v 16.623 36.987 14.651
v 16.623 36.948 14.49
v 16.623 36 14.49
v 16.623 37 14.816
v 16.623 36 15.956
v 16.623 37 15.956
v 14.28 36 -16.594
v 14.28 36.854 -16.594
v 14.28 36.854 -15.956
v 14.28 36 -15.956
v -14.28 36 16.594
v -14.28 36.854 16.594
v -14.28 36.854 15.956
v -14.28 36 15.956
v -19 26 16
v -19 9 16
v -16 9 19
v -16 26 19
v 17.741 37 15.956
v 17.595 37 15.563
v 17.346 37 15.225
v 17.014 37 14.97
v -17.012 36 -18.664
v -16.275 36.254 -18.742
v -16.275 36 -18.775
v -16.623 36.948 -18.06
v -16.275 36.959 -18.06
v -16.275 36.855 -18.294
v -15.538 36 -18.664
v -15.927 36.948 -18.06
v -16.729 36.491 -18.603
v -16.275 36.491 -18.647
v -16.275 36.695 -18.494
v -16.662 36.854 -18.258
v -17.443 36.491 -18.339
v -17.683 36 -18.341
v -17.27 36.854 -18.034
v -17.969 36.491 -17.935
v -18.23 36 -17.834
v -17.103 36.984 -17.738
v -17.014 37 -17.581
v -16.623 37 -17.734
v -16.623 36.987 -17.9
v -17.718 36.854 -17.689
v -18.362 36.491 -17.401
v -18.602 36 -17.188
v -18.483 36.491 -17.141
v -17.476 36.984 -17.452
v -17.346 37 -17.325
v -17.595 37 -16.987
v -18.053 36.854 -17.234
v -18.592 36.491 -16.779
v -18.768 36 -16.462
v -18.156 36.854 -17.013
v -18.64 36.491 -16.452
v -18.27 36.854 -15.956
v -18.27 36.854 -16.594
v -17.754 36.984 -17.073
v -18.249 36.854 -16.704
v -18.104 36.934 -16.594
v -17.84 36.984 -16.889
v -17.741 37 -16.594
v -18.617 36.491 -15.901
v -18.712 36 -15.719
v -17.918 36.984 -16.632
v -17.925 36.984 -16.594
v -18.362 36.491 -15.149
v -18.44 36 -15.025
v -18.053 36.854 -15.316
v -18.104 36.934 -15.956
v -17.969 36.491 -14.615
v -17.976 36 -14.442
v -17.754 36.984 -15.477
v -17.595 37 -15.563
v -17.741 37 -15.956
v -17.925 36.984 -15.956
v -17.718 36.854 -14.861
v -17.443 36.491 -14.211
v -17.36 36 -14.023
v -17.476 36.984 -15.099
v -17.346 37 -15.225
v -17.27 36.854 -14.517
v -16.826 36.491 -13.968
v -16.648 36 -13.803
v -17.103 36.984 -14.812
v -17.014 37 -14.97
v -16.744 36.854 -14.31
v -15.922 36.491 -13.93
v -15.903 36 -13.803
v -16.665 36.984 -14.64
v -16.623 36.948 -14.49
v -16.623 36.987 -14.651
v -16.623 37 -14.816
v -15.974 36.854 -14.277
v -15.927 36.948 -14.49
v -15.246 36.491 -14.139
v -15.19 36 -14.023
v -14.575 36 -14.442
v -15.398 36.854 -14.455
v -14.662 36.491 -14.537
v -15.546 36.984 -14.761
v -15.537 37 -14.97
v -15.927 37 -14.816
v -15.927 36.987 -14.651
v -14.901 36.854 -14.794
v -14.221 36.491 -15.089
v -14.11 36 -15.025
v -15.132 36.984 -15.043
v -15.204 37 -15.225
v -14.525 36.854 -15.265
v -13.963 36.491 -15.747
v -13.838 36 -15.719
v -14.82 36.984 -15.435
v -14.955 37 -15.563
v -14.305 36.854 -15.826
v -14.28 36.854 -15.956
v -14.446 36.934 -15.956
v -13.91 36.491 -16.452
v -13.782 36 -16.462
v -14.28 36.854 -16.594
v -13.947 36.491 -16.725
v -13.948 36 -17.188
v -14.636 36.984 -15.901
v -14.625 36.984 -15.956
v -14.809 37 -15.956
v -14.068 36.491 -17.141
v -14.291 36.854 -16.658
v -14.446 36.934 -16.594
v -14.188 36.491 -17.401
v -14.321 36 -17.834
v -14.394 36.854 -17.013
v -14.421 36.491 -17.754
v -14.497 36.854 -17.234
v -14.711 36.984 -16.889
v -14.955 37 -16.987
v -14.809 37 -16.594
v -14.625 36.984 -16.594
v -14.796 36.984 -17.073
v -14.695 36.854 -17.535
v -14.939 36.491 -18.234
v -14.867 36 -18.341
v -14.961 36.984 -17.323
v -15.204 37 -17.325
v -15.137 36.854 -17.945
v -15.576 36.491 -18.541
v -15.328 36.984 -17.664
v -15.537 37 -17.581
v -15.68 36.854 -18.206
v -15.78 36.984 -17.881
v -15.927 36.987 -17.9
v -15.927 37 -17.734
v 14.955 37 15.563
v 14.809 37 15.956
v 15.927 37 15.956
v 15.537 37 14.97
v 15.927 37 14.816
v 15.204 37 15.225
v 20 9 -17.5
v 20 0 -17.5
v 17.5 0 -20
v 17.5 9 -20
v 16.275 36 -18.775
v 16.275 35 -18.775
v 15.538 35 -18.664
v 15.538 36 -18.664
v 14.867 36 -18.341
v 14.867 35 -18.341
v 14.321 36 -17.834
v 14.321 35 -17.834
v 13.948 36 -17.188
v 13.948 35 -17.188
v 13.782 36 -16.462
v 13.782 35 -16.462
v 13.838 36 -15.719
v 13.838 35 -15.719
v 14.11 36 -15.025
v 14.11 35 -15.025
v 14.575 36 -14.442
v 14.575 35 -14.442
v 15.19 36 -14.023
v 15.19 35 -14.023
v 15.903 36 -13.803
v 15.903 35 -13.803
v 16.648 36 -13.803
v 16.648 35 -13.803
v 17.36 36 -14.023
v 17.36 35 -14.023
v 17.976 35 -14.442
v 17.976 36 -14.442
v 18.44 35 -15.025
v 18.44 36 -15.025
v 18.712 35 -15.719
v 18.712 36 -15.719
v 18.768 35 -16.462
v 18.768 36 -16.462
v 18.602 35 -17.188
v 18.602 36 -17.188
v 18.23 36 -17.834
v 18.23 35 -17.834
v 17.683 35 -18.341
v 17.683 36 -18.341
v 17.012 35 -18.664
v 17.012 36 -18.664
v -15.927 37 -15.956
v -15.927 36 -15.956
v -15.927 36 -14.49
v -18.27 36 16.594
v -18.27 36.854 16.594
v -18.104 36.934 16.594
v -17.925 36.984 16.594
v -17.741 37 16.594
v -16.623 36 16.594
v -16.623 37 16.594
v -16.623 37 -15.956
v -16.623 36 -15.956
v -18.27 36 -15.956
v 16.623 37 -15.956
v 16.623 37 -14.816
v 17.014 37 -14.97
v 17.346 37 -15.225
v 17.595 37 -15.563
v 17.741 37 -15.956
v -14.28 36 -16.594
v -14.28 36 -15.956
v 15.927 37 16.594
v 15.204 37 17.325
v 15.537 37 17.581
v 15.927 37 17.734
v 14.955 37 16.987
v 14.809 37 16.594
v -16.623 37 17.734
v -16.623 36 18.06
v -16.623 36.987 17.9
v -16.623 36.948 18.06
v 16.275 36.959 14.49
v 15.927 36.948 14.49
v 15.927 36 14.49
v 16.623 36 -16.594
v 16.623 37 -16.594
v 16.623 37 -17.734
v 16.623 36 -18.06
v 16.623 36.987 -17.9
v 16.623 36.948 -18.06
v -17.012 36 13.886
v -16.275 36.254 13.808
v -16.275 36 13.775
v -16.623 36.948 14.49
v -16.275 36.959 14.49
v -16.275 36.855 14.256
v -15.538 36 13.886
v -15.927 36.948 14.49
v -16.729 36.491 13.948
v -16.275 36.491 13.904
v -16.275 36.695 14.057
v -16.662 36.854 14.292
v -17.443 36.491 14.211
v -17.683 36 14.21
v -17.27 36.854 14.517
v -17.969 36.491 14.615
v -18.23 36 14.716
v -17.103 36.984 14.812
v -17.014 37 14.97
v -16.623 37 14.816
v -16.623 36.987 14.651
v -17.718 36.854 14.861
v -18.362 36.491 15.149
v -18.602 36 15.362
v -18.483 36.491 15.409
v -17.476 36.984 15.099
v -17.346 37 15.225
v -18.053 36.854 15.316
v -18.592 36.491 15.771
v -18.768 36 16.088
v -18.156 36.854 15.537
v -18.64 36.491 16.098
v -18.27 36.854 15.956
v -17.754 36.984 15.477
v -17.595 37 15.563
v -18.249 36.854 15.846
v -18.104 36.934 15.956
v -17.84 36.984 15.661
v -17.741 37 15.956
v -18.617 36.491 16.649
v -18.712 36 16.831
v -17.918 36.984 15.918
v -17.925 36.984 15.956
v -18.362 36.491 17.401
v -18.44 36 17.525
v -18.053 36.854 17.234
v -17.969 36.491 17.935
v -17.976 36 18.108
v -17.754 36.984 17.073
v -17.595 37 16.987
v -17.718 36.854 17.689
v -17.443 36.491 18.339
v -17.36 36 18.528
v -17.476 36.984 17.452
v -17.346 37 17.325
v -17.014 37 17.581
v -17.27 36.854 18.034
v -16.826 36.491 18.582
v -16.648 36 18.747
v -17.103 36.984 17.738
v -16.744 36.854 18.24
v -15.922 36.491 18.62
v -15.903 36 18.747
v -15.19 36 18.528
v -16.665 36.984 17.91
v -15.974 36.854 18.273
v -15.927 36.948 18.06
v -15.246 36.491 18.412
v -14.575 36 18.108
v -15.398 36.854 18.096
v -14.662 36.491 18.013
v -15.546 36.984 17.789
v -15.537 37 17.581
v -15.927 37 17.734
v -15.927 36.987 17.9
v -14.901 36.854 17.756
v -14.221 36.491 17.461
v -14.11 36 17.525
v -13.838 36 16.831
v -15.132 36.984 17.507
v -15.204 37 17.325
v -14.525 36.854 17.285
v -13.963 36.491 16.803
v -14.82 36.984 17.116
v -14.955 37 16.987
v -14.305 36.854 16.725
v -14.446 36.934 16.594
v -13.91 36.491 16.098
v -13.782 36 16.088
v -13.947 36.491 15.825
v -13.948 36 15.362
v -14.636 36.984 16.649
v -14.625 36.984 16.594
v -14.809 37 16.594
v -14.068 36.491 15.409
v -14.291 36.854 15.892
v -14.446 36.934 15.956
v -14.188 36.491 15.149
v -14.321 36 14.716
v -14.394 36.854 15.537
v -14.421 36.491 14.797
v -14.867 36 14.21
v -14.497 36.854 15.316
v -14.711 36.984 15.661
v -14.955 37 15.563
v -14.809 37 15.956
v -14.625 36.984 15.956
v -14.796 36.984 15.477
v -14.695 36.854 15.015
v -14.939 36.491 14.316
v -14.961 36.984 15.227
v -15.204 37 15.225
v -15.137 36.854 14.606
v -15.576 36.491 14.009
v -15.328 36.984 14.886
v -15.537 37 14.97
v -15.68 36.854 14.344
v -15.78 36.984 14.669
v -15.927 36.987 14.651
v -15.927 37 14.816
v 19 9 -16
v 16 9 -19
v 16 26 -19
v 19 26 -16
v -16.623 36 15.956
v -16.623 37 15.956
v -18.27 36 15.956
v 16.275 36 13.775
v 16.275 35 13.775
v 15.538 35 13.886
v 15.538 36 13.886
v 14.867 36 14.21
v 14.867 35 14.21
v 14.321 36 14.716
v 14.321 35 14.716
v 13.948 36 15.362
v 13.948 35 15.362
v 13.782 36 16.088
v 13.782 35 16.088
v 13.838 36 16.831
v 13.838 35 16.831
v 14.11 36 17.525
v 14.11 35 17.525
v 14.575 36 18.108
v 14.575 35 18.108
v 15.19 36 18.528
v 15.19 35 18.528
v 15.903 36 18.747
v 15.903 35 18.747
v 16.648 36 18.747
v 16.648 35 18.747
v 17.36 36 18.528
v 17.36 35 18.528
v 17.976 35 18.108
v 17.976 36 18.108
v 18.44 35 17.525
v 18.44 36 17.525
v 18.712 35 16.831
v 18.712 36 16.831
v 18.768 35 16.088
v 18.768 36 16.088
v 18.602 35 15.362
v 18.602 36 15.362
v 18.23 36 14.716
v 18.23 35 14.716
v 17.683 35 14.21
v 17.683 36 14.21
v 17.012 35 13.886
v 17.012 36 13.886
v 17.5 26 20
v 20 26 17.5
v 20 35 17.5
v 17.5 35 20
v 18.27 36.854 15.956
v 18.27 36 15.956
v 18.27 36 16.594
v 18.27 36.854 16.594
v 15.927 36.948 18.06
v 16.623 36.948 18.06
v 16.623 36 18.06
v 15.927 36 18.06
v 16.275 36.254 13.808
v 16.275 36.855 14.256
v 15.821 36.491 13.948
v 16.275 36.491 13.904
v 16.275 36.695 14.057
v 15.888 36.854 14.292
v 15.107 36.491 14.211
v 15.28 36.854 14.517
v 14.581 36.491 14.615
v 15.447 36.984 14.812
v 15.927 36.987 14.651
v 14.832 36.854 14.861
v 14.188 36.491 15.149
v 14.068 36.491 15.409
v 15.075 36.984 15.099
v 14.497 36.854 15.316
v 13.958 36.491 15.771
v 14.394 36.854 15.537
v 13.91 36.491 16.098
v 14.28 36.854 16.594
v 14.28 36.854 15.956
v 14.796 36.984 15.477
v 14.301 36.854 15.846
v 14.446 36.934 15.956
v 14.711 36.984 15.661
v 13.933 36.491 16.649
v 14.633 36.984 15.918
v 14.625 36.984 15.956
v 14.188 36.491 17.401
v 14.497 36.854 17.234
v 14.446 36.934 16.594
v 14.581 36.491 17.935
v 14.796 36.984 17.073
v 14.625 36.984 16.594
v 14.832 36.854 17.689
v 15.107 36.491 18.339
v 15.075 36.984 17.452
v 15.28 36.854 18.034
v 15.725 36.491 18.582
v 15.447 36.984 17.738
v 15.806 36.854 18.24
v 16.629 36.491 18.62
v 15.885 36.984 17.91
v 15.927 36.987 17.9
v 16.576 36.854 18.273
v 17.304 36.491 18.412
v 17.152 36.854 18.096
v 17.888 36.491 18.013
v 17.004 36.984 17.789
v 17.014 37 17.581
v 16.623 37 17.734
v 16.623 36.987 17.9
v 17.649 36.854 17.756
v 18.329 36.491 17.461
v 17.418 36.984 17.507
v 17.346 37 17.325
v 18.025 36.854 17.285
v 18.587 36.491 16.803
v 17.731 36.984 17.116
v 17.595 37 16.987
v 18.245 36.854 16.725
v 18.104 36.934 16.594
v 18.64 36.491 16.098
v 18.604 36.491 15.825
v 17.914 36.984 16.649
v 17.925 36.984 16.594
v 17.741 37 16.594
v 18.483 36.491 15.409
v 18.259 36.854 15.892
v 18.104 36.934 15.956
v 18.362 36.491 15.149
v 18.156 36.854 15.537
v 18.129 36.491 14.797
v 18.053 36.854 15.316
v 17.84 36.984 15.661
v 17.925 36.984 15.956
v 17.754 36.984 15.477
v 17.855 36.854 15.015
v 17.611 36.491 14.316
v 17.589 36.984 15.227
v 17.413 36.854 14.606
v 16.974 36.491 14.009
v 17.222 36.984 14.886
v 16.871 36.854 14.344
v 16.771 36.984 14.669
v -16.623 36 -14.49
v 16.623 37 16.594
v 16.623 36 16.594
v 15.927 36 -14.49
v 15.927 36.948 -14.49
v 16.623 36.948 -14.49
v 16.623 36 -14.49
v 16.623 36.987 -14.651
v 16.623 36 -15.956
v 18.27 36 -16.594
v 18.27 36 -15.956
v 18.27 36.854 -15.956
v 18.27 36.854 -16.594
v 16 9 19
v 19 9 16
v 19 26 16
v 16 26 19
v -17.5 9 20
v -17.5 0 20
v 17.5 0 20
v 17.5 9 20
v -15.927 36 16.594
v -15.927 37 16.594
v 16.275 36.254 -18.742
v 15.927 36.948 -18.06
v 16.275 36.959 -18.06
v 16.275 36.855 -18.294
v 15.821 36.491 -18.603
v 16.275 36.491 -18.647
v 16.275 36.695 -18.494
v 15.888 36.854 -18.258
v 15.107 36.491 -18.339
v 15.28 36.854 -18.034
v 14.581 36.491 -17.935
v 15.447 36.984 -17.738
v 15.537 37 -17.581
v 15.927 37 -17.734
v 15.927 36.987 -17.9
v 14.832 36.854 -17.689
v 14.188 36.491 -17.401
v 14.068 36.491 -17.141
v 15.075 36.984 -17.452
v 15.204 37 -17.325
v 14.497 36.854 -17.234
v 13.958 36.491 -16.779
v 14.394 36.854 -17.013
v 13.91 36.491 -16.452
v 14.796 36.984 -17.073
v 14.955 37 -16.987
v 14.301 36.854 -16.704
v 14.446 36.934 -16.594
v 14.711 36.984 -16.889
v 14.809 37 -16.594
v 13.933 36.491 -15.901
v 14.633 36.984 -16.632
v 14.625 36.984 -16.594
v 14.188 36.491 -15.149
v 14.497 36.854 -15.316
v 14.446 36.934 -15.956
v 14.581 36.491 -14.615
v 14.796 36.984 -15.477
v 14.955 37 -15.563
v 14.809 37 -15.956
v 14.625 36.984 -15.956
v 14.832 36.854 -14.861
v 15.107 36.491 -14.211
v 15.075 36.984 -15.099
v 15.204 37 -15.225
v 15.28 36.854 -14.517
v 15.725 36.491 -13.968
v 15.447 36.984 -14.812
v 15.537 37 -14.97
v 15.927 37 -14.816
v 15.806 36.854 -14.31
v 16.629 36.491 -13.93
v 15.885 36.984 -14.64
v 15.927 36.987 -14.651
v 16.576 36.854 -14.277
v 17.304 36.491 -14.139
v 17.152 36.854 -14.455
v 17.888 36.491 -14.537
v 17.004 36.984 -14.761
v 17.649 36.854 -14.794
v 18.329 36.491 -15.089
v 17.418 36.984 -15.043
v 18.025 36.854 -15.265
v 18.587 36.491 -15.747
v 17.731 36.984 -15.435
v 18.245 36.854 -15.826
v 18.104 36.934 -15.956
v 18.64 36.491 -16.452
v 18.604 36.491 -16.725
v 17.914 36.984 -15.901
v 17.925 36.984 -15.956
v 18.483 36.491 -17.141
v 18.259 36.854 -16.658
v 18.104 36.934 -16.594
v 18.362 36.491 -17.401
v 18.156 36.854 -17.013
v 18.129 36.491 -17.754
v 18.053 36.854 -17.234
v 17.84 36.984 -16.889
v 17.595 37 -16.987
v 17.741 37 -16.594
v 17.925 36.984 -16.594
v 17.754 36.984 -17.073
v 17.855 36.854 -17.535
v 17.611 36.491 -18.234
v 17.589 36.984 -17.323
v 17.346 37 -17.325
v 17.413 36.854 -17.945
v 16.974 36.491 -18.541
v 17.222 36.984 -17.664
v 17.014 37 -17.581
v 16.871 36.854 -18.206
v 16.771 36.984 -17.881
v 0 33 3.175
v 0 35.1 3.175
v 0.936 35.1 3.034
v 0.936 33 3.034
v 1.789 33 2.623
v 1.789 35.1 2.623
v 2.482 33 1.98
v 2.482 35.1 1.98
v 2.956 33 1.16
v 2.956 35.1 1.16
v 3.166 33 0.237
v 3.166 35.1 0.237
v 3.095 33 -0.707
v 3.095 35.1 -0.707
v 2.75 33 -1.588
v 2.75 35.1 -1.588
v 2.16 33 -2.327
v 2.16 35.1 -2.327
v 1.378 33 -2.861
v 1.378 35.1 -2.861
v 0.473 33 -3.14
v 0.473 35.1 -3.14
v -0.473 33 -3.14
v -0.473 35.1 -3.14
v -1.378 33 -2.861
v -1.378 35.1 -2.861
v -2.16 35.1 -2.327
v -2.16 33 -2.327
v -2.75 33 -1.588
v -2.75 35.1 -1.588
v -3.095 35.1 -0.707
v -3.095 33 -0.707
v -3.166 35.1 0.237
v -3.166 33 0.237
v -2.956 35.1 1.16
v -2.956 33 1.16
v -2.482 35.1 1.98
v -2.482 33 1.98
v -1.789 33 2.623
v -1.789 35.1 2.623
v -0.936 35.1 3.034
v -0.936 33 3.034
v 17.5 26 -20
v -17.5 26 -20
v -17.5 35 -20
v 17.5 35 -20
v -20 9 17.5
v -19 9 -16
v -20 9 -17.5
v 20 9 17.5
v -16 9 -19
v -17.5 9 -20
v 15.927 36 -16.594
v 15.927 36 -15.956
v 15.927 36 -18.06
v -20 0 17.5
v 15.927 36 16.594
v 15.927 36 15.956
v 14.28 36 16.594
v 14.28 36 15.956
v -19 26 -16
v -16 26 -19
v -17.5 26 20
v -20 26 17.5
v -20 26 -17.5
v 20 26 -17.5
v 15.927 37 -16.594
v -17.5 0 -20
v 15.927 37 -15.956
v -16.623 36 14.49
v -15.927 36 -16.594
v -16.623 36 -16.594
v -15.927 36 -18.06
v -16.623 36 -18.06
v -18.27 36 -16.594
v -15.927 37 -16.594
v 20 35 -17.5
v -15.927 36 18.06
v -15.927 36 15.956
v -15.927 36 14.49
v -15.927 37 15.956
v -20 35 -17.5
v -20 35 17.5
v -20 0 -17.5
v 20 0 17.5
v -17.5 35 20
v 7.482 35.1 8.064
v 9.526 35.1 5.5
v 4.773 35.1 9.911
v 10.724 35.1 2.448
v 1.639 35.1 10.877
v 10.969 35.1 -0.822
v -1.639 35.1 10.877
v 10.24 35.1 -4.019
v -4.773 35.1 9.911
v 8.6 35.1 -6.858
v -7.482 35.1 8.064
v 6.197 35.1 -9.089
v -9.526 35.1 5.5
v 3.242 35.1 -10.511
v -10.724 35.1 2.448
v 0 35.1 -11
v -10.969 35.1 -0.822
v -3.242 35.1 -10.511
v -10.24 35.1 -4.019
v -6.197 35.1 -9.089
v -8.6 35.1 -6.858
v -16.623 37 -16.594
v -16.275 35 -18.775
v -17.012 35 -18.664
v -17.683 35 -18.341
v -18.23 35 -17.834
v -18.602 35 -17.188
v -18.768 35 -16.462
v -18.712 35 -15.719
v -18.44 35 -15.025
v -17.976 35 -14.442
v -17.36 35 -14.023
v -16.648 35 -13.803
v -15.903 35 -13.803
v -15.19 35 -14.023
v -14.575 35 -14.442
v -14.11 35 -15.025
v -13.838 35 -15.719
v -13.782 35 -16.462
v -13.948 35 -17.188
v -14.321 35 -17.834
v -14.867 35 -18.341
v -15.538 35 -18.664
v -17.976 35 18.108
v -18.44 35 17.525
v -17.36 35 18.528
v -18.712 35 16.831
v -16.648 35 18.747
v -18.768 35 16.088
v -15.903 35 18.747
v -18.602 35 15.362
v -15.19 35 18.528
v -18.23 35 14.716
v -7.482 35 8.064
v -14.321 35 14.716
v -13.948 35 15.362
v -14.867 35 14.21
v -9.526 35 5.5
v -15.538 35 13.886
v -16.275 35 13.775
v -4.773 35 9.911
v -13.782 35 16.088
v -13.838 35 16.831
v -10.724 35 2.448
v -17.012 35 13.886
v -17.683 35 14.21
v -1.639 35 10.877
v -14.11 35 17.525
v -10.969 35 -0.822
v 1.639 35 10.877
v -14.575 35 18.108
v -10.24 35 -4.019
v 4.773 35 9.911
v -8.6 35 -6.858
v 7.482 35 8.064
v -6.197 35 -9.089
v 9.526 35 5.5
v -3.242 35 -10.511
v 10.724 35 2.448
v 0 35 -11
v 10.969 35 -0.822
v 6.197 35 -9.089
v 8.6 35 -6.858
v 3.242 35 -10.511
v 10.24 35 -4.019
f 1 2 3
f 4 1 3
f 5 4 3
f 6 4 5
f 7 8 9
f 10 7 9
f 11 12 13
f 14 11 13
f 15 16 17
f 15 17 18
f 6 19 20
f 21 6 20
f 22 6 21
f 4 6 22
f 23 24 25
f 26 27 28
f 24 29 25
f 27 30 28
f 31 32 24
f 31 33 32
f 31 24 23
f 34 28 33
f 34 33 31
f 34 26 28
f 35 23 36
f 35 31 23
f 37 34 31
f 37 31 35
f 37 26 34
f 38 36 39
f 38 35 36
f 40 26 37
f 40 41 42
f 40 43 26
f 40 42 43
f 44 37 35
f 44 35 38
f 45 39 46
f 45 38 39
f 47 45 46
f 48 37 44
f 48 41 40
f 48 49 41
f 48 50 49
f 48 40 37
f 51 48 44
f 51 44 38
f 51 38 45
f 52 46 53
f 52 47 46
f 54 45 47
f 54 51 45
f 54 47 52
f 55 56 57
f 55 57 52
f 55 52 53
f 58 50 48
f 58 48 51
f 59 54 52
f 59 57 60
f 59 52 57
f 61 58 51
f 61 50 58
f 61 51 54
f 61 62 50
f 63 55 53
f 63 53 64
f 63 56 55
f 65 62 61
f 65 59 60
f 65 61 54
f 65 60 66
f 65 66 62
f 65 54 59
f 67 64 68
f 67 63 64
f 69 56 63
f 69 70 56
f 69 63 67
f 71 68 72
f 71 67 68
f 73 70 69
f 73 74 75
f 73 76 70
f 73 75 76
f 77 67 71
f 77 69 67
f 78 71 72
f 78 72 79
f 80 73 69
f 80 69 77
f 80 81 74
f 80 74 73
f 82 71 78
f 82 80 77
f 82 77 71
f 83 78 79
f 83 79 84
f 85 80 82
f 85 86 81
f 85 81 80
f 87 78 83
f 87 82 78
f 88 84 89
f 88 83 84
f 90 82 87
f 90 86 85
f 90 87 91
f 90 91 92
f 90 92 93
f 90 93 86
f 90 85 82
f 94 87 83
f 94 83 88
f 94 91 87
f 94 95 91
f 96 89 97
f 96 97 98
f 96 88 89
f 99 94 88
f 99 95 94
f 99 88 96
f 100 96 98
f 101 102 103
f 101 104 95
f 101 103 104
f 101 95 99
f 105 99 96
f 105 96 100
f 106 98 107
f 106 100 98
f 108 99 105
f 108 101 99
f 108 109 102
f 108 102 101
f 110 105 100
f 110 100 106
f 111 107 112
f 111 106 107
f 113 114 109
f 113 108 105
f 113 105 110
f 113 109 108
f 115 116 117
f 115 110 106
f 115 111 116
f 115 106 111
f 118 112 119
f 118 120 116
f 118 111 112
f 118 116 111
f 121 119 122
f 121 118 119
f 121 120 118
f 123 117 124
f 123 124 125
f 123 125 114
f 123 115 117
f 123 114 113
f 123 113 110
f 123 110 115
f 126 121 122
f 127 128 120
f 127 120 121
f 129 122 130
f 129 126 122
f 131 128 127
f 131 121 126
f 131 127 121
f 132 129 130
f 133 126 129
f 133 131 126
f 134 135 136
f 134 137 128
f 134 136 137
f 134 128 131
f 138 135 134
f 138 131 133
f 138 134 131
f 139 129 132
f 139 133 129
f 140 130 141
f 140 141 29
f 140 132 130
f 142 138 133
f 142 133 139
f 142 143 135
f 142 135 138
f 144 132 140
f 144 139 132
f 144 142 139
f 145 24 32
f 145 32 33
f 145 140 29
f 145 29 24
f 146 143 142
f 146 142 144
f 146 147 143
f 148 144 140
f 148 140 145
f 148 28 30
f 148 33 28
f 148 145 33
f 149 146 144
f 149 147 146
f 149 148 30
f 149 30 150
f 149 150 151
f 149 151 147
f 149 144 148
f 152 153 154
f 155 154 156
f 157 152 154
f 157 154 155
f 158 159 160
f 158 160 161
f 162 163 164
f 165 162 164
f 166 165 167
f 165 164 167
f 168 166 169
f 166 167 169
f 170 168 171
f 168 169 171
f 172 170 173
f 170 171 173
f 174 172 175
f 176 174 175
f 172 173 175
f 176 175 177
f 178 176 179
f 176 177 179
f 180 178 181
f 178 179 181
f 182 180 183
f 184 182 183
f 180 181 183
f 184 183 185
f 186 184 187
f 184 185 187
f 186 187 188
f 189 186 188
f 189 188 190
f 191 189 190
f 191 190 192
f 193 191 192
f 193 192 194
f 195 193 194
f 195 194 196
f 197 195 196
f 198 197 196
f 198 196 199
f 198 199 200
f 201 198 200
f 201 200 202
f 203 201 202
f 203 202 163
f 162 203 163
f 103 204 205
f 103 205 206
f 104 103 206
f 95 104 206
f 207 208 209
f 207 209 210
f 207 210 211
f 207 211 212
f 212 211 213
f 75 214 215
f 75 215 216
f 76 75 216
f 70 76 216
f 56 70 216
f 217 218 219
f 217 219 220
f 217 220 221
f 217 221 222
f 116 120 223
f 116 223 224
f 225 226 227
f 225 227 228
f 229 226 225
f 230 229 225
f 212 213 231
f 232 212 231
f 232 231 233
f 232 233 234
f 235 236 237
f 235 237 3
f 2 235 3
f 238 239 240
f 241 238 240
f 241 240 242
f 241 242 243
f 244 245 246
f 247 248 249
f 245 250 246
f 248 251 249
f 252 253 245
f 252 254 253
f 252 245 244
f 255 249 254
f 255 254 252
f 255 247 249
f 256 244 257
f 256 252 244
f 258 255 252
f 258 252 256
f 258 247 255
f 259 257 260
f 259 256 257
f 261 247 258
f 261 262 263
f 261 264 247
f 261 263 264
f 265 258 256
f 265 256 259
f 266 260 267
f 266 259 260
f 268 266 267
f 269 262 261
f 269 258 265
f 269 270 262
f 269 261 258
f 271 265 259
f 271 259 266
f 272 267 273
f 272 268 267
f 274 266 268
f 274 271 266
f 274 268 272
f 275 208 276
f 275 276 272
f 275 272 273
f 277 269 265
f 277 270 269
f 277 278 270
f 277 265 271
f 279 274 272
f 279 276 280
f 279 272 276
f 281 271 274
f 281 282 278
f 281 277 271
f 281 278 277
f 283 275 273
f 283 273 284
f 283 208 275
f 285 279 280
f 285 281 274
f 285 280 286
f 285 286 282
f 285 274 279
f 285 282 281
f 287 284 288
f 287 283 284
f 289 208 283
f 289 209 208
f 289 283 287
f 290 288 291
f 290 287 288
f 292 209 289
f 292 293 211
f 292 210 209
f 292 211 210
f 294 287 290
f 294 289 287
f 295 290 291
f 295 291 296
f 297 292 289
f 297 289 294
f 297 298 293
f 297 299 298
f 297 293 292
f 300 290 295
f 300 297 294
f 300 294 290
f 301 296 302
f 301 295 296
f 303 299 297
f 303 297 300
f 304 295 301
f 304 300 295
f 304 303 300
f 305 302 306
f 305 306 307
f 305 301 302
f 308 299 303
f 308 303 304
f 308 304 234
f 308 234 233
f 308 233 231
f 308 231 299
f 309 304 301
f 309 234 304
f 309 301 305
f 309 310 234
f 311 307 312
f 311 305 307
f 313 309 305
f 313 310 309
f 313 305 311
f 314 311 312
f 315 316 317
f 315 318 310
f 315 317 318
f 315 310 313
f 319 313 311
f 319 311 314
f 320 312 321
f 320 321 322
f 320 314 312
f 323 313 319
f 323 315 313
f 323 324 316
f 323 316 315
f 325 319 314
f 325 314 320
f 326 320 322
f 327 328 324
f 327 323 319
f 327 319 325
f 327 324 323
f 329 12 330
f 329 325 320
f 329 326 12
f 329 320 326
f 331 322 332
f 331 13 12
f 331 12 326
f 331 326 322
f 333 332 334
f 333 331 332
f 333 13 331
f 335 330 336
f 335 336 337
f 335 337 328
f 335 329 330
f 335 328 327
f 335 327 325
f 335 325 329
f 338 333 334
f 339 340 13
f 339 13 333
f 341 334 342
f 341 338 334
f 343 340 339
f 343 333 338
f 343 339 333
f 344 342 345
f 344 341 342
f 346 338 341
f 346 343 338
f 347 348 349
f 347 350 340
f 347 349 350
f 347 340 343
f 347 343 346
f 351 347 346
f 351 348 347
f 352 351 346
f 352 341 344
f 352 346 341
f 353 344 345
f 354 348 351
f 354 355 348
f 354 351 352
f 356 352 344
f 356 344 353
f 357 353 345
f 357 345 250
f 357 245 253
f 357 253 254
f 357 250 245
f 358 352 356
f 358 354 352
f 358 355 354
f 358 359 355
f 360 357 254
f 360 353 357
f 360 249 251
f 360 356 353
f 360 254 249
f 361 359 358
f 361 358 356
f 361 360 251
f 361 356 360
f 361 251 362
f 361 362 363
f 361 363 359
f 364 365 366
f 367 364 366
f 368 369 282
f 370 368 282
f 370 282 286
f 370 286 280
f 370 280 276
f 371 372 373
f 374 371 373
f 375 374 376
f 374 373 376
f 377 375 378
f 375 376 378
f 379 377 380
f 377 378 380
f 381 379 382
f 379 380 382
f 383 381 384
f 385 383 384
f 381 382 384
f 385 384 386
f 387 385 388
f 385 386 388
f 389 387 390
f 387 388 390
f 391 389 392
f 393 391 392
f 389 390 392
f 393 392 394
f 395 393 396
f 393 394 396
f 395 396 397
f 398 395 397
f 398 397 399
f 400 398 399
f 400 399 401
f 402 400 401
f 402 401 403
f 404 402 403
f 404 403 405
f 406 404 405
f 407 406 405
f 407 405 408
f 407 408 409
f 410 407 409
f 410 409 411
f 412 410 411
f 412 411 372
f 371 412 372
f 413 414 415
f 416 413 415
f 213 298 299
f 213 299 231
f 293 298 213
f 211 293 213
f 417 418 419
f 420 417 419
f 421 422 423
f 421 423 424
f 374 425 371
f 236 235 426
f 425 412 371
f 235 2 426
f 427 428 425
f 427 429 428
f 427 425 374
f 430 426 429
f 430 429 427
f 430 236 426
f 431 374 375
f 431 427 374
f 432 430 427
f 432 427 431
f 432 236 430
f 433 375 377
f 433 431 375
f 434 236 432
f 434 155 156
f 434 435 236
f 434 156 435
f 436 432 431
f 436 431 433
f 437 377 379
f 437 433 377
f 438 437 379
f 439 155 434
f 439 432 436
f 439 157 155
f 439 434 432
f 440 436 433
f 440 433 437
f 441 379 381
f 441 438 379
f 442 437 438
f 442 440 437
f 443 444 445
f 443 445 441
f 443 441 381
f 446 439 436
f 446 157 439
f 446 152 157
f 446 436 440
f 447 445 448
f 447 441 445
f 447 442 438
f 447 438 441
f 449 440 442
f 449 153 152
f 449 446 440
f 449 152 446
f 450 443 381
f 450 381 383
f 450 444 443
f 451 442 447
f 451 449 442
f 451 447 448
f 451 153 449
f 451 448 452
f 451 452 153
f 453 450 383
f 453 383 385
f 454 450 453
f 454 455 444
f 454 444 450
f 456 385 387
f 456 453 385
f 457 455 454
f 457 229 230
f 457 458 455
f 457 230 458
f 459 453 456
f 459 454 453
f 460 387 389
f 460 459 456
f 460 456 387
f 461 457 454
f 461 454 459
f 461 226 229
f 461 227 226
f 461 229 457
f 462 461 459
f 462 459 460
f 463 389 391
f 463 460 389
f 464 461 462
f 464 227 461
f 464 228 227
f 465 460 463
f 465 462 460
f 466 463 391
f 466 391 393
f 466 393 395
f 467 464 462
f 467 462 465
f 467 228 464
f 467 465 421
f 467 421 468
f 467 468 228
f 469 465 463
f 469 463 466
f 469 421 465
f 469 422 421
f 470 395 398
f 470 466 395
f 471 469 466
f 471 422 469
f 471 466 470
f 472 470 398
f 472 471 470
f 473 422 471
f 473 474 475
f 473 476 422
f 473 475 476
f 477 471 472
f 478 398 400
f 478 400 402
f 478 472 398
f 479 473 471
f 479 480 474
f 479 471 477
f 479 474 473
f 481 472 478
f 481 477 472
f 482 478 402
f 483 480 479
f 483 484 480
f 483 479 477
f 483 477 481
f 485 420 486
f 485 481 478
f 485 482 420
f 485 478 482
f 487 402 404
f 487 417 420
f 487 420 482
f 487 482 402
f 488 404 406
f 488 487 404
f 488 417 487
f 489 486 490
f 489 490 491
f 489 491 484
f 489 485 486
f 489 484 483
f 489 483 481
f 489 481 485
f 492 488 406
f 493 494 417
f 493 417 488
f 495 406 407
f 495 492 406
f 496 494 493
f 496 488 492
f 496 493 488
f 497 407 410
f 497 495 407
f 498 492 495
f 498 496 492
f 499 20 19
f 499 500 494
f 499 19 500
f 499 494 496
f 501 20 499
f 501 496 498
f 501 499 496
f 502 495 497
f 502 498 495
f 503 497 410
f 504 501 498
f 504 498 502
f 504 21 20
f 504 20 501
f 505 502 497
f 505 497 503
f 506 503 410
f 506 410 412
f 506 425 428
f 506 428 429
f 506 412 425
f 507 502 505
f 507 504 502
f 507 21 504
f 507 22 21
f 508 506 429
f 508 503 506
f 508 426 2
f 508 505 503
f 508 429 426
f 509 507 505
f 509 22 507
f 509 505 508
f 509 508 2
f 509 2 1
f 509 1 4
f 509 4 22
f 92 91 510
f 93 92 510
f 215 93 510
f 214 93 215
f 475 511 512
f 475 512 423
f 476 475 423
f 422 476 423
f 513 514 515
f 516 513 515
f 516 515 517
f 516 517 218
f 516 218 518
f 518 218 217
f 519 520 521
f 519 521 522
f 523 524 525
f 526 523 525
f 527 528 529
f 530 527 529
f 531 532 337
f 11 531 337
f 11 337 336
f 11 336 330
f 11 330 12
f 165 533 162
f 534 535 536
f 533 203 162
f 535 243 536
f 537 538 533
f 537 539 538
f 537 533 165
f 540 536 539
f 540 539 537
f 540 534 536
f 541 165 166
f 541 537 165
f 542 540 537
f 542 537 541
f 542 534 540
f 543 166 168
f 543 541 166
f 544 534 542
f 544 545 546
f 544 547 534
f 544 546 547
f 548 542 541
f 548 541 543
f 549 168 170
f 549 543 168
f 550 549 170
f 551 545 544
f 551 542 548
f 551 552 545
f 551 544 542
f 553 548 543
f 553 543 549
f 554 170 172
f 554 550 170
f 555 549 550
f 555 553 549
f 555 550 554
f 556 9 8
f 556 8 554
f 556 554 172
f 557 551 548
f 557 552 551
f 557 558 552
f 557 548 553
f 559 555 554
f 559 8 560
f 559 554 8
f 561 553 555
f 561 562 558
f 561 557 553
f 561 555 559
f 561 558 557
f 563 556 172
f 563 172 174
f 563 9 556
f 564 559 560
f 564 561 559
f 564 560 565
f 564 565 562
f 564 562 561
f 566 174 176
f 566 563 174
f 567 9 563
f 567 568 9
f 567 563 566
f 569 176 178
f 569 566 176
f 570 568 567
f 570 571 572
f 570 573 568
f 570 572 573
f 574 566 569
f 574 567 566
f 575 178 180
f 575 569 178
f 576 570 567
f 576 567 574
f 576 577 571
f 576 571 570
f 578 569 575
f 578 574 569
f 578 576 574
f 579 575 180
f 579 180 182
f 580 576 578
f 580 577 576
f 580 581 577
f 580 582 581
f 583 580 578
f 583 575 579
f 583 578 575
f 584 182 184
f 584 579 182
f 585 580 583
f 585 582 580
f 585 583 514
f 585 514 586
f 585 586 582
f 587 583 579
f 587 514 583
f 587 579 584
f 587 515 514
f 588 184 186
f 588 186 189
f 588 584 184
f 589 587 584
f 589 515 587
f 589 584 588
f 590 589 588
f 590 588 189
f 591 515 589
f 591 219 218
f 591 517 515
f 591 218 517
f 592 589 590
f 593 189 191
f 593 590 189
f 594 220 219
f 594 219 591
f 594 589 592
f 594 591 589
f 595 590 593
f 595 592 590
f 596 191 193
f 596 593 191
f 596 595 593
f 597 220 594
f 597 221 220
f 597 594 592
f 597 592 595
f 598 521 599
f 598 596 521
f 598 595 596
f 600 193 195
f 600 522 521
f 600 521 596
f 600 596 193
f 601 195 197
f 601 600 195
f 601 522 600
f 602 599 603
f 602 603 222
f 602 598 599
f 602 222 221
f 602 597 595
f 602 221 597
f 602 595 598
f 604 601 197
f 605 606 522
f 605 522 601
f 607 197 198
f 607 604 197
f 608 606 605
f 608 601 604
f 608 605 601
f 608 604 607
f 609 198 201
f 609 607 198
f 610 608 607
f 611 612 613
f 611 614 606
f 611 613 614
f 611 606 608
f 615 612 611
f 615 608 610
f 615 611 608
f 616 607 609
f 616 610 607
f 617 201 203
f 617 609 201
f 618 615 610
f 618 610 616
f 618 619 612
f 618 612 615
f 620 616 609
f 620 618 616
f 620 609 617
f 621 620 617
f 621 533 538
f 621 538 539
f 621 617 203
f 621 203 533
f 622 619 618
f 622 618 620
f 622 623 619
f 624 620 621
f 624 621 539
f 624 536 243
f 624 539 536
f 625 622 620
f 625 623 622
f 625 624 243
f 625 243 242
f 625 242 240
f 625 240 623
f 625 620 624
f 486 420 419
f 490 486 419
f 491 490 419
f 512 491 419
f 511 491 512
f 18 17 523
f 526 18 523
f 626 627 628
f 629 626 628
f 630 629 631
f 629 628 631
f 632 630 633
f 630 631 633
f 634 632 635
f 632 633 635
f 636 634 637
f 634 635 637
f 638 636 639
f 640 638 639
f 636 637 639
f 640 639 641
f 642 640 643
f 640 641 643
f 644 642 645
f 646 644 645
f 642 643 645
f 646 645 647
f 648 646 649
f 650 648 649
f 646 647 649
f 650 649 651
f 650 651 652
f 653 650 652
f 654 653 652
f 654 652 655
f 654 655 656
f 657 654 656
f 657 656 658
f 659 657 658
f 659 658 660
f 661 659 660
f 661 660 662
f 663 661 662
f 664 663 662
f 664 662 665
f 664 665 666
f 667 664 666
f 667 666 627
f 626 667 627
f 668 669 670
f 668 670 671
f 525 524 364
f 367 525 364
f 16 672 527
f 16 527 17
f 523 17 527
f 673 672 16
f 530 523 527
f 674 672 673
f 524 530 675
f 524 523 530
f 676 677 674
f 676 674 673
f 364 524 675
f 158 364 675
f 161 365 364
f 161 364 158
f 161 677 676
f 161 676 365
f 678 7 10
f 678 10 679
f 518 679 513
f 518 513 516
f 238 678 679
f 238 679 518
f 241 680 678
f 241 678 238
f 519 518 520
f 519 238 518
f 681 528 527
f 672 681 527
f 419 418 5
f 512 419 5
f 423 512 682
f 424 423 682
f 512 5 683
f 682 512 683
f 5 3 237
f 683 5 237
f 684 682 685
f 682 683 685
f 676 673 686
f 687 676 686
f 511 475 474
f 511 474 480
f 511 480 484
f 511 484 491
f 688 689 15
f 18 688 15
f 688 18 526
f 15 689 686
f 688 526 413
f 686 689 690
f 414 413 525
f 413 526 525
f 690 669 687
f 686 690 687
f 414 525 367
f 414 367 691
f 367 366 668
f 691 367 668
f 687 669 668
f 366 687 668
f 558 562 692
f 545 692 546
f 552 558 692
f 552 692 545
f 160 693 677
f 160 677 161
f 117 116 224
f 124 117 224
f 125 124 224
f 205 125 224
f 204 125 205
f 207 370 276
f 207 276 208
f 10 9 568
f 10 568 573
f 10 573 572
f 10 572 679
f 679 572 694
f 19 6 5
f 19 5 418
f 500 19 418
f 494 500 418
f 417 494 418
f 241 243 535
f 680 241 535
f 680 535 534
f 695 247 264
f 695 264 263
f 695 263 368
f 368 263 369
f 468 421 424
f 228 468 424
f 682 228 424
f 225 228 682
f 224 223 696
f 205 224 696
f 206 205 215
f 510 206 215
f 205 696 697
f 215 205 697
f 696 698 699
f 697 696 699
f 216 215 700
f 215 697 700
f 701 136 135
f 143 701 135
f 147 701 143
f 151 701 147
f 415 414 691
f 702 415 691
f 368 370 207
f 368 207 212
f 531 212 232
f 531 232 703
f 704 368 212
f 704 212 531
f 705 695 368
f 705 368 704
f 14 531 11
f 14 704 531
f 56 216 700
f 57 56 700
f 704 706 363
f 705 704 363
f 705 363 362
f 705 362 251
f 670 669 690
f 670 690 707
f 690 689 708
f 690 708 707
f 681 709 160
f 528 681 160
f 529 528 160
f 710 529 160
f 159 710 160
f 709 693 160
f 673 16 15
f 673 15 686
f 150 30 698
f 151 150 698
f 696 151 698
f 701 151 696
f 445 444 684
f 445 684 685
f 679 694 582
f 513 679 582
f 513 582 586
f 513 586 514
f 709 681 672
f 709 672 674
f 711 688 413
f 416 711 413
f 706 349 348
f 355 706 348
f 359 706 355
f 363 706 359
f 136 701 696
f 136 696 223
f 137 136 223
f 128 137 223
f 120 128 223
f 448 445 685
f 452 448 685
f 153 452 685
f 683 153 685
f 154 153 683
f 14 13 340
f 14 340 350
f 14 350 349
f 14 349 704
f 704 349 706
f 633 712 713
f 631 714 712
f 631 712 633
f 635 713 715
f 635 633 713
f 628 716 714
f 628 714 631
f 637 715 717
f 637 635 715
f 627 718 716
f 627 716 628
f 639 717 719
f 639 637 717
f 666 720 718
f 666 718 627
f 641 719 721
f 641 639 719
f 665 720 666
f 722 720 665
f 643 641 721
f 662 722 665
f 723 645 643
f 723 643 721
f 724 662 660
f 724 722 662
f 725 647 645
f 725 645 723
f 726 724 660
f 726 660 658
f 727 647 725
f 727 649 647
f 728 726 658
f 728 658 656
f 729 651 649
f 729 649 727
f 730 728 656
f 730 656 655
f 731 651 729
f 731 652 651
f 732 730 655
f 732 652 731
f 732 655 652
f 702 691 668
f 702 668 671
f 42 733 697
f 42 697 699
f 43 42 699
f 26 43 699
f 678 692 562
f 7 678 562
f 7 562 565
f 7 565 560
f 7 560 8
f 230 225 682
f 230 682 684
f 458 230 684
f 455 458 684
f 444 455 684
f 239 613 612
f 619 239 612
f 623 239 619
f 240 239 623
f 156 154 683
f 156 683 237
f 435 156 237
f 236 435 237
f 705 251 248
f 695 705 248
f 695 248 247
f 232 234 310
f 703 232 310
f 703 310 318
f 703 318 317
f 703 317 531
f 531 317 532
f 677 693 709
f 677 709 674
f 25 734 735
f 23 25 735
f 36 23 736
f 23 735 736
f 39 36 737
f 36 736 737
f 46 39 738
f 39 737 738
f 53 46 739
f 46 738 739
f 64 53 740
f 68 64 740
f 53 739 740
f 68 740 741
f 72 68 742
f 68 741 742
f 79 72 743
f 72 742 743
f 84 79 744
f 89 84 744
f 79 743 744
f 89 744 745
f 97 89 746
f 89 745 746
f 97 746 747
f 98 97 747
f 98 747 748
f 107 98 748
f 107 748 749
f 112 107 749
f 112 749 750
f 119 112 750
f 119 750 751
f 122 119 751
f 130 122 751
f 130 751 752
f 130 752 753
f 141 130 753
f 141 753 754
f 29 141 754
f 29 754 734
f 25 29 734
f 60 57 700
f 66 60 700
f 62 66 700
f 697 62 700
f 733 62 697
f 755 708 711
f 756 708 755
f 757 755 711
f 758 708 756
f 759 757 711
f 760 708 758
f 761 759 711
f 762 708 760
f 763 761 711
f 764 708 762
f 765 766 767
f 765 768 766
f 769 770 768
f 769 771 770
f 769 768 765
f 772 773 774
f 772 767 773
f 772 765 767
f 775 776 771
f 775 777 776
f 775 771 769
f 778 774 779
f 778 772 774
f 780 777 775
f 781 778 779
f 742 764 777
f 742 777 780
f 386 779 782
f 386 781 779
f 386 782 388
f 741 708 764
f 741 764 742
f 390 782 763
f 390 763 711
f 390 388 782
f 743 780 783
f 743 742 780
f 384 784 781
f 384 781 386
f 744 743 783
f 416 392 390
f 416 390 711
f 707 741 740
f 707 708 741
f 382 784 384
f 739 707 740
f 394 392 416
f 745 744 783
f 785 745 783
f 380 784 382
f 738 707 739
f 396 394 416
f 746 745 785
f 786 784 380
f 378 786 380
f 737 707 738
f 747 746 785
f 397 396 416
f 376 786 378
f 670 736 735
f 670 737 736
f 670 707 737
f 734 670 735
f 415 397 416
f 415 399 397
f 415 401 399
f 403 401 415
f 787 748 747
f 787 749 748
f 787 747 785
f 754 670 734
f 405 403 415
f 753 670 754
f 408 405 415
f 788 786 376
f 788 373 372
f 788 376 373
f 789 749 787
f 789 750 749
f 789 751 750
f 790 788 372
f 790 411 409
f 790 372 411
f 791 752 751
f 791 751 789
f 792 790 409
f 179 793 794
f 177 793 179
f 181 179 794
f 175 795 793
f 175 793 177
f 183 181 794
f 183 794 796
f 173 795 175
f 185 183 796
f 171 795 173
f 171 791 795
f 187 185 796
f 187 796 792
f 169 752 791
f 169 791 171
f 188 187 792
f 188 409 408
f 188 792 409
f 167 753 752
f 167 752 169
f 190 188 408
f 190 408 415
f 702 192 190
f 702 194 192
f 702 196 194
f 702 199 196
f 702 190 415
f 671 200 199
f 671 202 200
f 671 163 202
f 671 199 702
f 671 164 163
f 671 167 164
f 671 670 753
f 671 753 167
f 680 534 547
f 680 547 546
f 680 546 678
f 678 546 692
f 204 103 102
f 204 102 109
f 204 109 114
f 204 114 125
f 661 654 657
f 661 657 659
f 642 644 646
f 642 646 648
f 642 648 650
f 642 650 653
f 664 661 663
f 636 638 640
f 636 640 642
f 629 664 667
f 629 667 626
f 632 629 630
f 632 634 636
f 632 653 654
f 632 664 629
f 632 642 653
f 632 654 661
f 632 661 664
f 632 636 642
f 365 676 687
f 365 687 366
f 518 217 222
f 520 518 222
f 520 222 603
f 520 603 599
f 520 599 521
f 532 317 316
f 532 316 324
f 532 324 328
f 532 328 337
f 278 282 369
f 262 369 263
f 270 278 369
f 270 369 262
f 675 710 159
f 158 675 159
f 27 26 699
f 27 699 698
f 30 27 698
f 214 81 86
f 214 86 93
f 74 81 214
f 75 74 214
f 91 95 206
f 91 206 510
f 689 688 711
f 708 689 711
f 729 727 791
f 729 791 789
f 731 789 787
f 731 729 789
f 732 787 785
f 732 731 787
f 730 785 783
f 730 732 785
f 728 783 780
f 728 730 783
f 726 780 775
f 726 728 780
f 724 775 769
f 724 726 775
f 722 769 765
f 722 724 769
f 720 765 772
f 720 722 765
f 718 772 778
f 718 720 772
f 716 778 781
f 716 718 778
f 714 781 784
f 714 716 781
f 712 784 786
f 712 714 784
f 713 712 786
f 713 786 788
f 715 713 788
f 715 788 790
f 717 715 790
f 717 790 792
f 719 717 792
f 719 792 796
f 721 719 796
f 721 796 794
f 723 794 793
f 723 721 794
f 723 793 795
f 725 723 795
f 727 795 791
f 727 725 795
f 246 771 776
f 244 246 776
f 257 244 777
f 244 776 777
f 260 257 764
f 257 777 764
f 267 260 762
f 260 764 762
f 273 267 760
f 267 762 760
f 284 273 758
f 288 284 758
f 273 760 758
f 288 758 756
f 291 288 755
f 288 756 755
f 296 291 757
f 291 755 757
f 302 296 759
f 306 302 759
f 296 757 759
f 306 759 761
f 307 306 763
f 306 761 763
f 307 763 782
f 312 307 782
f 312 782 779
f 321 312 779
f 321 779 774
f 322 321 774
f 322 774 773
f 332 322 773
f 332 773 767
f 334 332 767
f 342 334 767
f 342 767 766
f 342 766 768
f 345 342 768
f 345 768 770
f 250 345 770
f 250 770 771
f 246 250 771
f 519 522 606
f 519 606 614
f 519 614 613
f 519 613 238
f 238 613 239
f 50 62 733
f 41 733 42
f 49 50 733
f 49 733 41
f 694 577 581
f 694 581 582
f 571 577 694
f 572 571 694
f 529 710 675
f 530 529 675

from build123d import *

# Parameters (mm, degrees)
CROQUIS1_W              = 40
CROQUIS1_H              = 40
SALIENTE_EXTRUIR1_DEPTH = 9
CROQUIS2_W              = 38
CROQUIS2_H              = 38
SALIENTE_EXTRUIR2_DEPTH = 17
CROQUIS3_W              = 40
CROQUIS3_H              = 40
SALIENTE_EXTRUIR3_DEPTH = 9
CHAFL_N1_SIZE           = 3
CHAFL_N2_SIZE           = 2.5
CROQUIS4_R              = 3.175
CORTAR_EXTRUIR1_DEPTH   = 2
SALIENTE_EXTRUIR4_START = 0.1
CROQUIS5_R              = 11
CROQUIS5_R_2            = 3.175
SALIENTE_EXTRUIR4_DEPTH = 0.1
CROQUIS6_R              = 2.5
SALIENTE_EXTRUIR5_DEPTH = 2
CORTAR_EXTRUIR2_DEPTH   = 1
REDONDEO1_R             = 1


with BuildPart() as part:
    # Croquis1 → Saliente-Extruir1 (new body)
    with BuildSketch(Plane(origin=(0, 0, 0), x_dir=(1, 0, 0), z_dir=(0, 1, 0))):
        Rectangle(CROQUIS1_W, CROQUIS1_H)
    extrude(amount=SALIENTE_EXTRUIR1_DEPTH)

    # Croquis2 → Saliente-Extruir2 (add)
    with BuildSketch(Plane(origin=(0, 9, 0), x_dir=(1, 0, 0), z_dir=(0, 1, 0))):
        Rectangle(CROQUIS2_W, CROQUIS2_H)
    extrude(amount=SALIENTE_EXTRUIR2_DEPTH)

    # Croquis3 → Saliente-Extruir3 (add)
    with BuildSketch(Plane(origin=(0, 26, 0), x_dir=(1, 0, 0), z_dir=(0, 1, 0))):
        Rectangle(CROQUIS3_W, CROQUIS3_H)
    extrude(amount=SALIENTE_EXTRUIR3_DEPTH)

    # Chaflán1
    chafl_n1_edges = [part.edges().sort_by_distance(p)[0] for p in [
        (-19, 17.5, -19),
        (-19, 17.5, 19),
        (19, 17.5, 19),
        (19, 17.5, -19),
    ]]
    chamfer(chafl_n1_edges, length=CHAFL_N1_SIZE)

    # Chaflán2
    chafl_n2_edges = [part.edges().sort_by_distance(p)[0] for p in [
        (-20, 30.5, -20),
        (-20, 30.5, 20),
        (20, 30.5, 20),
        (20, 30.5, -20),
        (20, 4.5, 20),
        (-20, 4.5, 20),
        (-20, 4.5, -20),
        (20, 4.5, -20),
    ]]
    chamfer(chafl_n2_edges, length=CHAFL_N2_SIZE)

    # Croquis4 → Cortar-Extruir1 (cut)
    with BuildSketch(Plane(origin=(0, 35, 0), x_dir=(1, 0, 0), z_dir=(0, 1, 0))):
        with Locations(Location((0, 0, 0), (0, 0, 270))):
            Circle(CROQUIS4_R)
    extrude(amount=-CORTAR_EXTRUIR1_DEPTH, mode=Mode.SUBTRACT)

    # Croquis5 → Saliente-Extruir4 (add)
    with BuildSketch(Plane(origin=(0, 35, 0), x_dir=(1, 0, 0), z_dir=(0, 1, 0)).offset(SALIENTE_EXTRUIR4_START)):
        with Locations(Location((0, 0, 0), (0, 0, 90))):
            Circle(CROQUIS5_R)
        with Locations(Location((0, 0, 0), (0, 0, 270))):
            Circle(CROQUIS5_R_2, mode=Mode.SUBTRACT)
    extrude(amount=-SALIENTE_EXTRUIR4_DEPTH)

    # Croquis6 → Saliente-Extruir5 (add)
    with BuildSketch(Plane(origin=(0, 35, 0), x_dir=(1, 0, 0), z_dir=(0, 1, 0))):
        with Locations(Location((-16.275126266, -16.275126266, 0), (0, 0, 90))):
            Circle(CROQUIS6_R)
        with Locations(Location((-16.275126266, 16.275126266, 0), (0, 0, 90))):
            Circle(CROQUIS6_R)
        with Locations(Location((16.275126266, 16.275126266, 0), (0, 0, 90))):
            Circle(CROQUIS6_R)
        with Locations(Location((16.275126266, -16.275126266, 0), (0, 0, 90))):
            Circle(CROQUIS6_R)
    extrude(amount=SALIENTE_EXTRUIR5_DEPTH)

    # Croquis7 → Cortar-Extruir2 (cut)
    with BuildSketch(Plane(origin=(0, 37, 0), x_dir=(1, 0, 0), z_dir=(0, 1, 0))):
        Polygon((-15.926951302, -15.956416982), (-15.926951302, -14.490184749), (-16.62330123, -14.490184749), (-16.62330123, -15.956416982), (-18.27030182, -15.956416982), (-18.27030182, -16.593835549), (-16.62330123, -16.593835549), (-16.62330123, -18.060067782), (-15.926951302, -18.060067782), (-15.926951302, -16.593835549), (-14.279950711, -16.593835549), (-14.279950711, -15.956416982), align=None)
        Polygon((-16.62330123, 15.956416982), (-18.27030182, 15.956416982), (-18.27030182, 16.593835549), (-16.62330123, 16.593835549), (-16.62330123, 18.060067782), (-15.926951302, 18.060067782), (-15.926951302, 16.593835549), (-14.279950711, 16.593835549), (-14.279950711, 15.956416982), (-15.926951302, 15.956416982), (-15.926951302, 14.490184749), (-16.62330123, 14.490184749), align=None)
        Polygon((15.926951302, 15.956416982), (15.926951302, 14.490184749), (16.62330123, 14.490184749), (16.62330123, 15.956416982), (18.27030182, 15.956416982), (18.27030182, 16.593835549), (16.62330123, 16.593835549), (16.62330123, 18.060067782), (15.926951302, 18.060067782), (15.926951302, 16.593835549), (14.279950711, 16.593835549), (14.279950711, 15.956416982), align=None)
        Polygon((16.62330123, -15.956416982), (18.27030182, -15.956416982), (18.27030182, -16.593835549), (16.62330123, -16.593835549), (16.62330123, -18.060067782), (15.926951302, -18.060067782), (15.926951302, -16.593835549), (14.279950711, -16.593835549), (14.279950711, -15.956416982), (15.926951302, -15.956416982), (15.926951302, -14.490184749), (16.62330123, -14.490184749), align=None)
    extrude(amount=-CORTAR_EXTRUIR2_DEPTH, mode=Mode.SUBTRACT)

    # Redondeo1
    # the kernel refuses this fillet: 1 mm, written as the material it takes off along each edge
    with BuildSketch(Plane(origin=(16.275126266, 37, -16.275126266), x_dir=(0, 0, -1), z_dir=(1, 0, 0))) as redondeo1_piece_1:
        with BuildLine():
            CenterArc((2.5 - REDONDEO1_R, -REDONDEO1_R), REDONDEO1_R, 0, 90)
            Line((2.5 - REDONDEO1_R, 0), (2.5, 0))
            Line((2.5, 0), (2.5, -REDONDEO1_R))
        make_face()
    revolve(axis=Axis((16.275126266, 37, -16.275126266), (0, 1, 0)), mode=Mode.SUBTRACT)
    with BuildSketch(Plane(origin=(16.275126266, 37, 16.275126266), x_dir=(0, 0, -1), z_dir=(1, 0, 0))) as redondeo1_piece_2:
        with BuildLine():
            CenterArc((2.5 - REDONDEO1_R, -REDONDEO1_R), REDONDEO1_R, 0, 90)
            Line((2.5 - REDONDEO1_R, 0), (2.5, 0))
            Line((2.5, 0), (2.5, -REDONDEO1_R))
        make_face()
    revolve(axis=Axis((16.275126266, 37, 16.275126266), (0, 1, 0)), mode=Mode.SUBTRACT)
    with BuildSketch(Plane(origin=(-16.275126266, 37, -16.275126266), x_dir=(0, 0, -1), z_dir=(1, 0, 0))) as redondeo1_piece_3:
        with BuildLine():
            CenterArc((2.5 - REDONDEO1_R, -REDONDEO1_R), REDONDEO1_R, 0, 90)
            Line((2.5 - REDONDEO1_R, 0), (2.5, 0))
            Line((2.5, 0), (2.5, -REDONDEO1_R))
        make_face()
    revolve(axis=Axis((-16.275126266, 37, -16.275126266), (0, 1, 0)), mode=Mode.SUBTRACT)
    with BuildSketch(Plane(origin=(-16.275126266, 37, 16.275126266), x_dir=(0, 0, -1), z_dir=(1, 0, 0))) as redondeo1_piece_4:
        with BuildLine():
            CenterArc((2.5 - REDONDEO1_R, -REDONDEO1_R), REDONDEO1_R, 0, 90)
            Line((2.5 - REDONDEO1_R, 0), (2.5, 0))
            Line((2.5, 0), (2.5, -REDONDEO1_R))
        make_face()
    revolve(axis=Axis((-16.275126266, 37, 16.275126266), (0, 1, 0)), mode=Mode.SUBTRACT)


solid = part.part
